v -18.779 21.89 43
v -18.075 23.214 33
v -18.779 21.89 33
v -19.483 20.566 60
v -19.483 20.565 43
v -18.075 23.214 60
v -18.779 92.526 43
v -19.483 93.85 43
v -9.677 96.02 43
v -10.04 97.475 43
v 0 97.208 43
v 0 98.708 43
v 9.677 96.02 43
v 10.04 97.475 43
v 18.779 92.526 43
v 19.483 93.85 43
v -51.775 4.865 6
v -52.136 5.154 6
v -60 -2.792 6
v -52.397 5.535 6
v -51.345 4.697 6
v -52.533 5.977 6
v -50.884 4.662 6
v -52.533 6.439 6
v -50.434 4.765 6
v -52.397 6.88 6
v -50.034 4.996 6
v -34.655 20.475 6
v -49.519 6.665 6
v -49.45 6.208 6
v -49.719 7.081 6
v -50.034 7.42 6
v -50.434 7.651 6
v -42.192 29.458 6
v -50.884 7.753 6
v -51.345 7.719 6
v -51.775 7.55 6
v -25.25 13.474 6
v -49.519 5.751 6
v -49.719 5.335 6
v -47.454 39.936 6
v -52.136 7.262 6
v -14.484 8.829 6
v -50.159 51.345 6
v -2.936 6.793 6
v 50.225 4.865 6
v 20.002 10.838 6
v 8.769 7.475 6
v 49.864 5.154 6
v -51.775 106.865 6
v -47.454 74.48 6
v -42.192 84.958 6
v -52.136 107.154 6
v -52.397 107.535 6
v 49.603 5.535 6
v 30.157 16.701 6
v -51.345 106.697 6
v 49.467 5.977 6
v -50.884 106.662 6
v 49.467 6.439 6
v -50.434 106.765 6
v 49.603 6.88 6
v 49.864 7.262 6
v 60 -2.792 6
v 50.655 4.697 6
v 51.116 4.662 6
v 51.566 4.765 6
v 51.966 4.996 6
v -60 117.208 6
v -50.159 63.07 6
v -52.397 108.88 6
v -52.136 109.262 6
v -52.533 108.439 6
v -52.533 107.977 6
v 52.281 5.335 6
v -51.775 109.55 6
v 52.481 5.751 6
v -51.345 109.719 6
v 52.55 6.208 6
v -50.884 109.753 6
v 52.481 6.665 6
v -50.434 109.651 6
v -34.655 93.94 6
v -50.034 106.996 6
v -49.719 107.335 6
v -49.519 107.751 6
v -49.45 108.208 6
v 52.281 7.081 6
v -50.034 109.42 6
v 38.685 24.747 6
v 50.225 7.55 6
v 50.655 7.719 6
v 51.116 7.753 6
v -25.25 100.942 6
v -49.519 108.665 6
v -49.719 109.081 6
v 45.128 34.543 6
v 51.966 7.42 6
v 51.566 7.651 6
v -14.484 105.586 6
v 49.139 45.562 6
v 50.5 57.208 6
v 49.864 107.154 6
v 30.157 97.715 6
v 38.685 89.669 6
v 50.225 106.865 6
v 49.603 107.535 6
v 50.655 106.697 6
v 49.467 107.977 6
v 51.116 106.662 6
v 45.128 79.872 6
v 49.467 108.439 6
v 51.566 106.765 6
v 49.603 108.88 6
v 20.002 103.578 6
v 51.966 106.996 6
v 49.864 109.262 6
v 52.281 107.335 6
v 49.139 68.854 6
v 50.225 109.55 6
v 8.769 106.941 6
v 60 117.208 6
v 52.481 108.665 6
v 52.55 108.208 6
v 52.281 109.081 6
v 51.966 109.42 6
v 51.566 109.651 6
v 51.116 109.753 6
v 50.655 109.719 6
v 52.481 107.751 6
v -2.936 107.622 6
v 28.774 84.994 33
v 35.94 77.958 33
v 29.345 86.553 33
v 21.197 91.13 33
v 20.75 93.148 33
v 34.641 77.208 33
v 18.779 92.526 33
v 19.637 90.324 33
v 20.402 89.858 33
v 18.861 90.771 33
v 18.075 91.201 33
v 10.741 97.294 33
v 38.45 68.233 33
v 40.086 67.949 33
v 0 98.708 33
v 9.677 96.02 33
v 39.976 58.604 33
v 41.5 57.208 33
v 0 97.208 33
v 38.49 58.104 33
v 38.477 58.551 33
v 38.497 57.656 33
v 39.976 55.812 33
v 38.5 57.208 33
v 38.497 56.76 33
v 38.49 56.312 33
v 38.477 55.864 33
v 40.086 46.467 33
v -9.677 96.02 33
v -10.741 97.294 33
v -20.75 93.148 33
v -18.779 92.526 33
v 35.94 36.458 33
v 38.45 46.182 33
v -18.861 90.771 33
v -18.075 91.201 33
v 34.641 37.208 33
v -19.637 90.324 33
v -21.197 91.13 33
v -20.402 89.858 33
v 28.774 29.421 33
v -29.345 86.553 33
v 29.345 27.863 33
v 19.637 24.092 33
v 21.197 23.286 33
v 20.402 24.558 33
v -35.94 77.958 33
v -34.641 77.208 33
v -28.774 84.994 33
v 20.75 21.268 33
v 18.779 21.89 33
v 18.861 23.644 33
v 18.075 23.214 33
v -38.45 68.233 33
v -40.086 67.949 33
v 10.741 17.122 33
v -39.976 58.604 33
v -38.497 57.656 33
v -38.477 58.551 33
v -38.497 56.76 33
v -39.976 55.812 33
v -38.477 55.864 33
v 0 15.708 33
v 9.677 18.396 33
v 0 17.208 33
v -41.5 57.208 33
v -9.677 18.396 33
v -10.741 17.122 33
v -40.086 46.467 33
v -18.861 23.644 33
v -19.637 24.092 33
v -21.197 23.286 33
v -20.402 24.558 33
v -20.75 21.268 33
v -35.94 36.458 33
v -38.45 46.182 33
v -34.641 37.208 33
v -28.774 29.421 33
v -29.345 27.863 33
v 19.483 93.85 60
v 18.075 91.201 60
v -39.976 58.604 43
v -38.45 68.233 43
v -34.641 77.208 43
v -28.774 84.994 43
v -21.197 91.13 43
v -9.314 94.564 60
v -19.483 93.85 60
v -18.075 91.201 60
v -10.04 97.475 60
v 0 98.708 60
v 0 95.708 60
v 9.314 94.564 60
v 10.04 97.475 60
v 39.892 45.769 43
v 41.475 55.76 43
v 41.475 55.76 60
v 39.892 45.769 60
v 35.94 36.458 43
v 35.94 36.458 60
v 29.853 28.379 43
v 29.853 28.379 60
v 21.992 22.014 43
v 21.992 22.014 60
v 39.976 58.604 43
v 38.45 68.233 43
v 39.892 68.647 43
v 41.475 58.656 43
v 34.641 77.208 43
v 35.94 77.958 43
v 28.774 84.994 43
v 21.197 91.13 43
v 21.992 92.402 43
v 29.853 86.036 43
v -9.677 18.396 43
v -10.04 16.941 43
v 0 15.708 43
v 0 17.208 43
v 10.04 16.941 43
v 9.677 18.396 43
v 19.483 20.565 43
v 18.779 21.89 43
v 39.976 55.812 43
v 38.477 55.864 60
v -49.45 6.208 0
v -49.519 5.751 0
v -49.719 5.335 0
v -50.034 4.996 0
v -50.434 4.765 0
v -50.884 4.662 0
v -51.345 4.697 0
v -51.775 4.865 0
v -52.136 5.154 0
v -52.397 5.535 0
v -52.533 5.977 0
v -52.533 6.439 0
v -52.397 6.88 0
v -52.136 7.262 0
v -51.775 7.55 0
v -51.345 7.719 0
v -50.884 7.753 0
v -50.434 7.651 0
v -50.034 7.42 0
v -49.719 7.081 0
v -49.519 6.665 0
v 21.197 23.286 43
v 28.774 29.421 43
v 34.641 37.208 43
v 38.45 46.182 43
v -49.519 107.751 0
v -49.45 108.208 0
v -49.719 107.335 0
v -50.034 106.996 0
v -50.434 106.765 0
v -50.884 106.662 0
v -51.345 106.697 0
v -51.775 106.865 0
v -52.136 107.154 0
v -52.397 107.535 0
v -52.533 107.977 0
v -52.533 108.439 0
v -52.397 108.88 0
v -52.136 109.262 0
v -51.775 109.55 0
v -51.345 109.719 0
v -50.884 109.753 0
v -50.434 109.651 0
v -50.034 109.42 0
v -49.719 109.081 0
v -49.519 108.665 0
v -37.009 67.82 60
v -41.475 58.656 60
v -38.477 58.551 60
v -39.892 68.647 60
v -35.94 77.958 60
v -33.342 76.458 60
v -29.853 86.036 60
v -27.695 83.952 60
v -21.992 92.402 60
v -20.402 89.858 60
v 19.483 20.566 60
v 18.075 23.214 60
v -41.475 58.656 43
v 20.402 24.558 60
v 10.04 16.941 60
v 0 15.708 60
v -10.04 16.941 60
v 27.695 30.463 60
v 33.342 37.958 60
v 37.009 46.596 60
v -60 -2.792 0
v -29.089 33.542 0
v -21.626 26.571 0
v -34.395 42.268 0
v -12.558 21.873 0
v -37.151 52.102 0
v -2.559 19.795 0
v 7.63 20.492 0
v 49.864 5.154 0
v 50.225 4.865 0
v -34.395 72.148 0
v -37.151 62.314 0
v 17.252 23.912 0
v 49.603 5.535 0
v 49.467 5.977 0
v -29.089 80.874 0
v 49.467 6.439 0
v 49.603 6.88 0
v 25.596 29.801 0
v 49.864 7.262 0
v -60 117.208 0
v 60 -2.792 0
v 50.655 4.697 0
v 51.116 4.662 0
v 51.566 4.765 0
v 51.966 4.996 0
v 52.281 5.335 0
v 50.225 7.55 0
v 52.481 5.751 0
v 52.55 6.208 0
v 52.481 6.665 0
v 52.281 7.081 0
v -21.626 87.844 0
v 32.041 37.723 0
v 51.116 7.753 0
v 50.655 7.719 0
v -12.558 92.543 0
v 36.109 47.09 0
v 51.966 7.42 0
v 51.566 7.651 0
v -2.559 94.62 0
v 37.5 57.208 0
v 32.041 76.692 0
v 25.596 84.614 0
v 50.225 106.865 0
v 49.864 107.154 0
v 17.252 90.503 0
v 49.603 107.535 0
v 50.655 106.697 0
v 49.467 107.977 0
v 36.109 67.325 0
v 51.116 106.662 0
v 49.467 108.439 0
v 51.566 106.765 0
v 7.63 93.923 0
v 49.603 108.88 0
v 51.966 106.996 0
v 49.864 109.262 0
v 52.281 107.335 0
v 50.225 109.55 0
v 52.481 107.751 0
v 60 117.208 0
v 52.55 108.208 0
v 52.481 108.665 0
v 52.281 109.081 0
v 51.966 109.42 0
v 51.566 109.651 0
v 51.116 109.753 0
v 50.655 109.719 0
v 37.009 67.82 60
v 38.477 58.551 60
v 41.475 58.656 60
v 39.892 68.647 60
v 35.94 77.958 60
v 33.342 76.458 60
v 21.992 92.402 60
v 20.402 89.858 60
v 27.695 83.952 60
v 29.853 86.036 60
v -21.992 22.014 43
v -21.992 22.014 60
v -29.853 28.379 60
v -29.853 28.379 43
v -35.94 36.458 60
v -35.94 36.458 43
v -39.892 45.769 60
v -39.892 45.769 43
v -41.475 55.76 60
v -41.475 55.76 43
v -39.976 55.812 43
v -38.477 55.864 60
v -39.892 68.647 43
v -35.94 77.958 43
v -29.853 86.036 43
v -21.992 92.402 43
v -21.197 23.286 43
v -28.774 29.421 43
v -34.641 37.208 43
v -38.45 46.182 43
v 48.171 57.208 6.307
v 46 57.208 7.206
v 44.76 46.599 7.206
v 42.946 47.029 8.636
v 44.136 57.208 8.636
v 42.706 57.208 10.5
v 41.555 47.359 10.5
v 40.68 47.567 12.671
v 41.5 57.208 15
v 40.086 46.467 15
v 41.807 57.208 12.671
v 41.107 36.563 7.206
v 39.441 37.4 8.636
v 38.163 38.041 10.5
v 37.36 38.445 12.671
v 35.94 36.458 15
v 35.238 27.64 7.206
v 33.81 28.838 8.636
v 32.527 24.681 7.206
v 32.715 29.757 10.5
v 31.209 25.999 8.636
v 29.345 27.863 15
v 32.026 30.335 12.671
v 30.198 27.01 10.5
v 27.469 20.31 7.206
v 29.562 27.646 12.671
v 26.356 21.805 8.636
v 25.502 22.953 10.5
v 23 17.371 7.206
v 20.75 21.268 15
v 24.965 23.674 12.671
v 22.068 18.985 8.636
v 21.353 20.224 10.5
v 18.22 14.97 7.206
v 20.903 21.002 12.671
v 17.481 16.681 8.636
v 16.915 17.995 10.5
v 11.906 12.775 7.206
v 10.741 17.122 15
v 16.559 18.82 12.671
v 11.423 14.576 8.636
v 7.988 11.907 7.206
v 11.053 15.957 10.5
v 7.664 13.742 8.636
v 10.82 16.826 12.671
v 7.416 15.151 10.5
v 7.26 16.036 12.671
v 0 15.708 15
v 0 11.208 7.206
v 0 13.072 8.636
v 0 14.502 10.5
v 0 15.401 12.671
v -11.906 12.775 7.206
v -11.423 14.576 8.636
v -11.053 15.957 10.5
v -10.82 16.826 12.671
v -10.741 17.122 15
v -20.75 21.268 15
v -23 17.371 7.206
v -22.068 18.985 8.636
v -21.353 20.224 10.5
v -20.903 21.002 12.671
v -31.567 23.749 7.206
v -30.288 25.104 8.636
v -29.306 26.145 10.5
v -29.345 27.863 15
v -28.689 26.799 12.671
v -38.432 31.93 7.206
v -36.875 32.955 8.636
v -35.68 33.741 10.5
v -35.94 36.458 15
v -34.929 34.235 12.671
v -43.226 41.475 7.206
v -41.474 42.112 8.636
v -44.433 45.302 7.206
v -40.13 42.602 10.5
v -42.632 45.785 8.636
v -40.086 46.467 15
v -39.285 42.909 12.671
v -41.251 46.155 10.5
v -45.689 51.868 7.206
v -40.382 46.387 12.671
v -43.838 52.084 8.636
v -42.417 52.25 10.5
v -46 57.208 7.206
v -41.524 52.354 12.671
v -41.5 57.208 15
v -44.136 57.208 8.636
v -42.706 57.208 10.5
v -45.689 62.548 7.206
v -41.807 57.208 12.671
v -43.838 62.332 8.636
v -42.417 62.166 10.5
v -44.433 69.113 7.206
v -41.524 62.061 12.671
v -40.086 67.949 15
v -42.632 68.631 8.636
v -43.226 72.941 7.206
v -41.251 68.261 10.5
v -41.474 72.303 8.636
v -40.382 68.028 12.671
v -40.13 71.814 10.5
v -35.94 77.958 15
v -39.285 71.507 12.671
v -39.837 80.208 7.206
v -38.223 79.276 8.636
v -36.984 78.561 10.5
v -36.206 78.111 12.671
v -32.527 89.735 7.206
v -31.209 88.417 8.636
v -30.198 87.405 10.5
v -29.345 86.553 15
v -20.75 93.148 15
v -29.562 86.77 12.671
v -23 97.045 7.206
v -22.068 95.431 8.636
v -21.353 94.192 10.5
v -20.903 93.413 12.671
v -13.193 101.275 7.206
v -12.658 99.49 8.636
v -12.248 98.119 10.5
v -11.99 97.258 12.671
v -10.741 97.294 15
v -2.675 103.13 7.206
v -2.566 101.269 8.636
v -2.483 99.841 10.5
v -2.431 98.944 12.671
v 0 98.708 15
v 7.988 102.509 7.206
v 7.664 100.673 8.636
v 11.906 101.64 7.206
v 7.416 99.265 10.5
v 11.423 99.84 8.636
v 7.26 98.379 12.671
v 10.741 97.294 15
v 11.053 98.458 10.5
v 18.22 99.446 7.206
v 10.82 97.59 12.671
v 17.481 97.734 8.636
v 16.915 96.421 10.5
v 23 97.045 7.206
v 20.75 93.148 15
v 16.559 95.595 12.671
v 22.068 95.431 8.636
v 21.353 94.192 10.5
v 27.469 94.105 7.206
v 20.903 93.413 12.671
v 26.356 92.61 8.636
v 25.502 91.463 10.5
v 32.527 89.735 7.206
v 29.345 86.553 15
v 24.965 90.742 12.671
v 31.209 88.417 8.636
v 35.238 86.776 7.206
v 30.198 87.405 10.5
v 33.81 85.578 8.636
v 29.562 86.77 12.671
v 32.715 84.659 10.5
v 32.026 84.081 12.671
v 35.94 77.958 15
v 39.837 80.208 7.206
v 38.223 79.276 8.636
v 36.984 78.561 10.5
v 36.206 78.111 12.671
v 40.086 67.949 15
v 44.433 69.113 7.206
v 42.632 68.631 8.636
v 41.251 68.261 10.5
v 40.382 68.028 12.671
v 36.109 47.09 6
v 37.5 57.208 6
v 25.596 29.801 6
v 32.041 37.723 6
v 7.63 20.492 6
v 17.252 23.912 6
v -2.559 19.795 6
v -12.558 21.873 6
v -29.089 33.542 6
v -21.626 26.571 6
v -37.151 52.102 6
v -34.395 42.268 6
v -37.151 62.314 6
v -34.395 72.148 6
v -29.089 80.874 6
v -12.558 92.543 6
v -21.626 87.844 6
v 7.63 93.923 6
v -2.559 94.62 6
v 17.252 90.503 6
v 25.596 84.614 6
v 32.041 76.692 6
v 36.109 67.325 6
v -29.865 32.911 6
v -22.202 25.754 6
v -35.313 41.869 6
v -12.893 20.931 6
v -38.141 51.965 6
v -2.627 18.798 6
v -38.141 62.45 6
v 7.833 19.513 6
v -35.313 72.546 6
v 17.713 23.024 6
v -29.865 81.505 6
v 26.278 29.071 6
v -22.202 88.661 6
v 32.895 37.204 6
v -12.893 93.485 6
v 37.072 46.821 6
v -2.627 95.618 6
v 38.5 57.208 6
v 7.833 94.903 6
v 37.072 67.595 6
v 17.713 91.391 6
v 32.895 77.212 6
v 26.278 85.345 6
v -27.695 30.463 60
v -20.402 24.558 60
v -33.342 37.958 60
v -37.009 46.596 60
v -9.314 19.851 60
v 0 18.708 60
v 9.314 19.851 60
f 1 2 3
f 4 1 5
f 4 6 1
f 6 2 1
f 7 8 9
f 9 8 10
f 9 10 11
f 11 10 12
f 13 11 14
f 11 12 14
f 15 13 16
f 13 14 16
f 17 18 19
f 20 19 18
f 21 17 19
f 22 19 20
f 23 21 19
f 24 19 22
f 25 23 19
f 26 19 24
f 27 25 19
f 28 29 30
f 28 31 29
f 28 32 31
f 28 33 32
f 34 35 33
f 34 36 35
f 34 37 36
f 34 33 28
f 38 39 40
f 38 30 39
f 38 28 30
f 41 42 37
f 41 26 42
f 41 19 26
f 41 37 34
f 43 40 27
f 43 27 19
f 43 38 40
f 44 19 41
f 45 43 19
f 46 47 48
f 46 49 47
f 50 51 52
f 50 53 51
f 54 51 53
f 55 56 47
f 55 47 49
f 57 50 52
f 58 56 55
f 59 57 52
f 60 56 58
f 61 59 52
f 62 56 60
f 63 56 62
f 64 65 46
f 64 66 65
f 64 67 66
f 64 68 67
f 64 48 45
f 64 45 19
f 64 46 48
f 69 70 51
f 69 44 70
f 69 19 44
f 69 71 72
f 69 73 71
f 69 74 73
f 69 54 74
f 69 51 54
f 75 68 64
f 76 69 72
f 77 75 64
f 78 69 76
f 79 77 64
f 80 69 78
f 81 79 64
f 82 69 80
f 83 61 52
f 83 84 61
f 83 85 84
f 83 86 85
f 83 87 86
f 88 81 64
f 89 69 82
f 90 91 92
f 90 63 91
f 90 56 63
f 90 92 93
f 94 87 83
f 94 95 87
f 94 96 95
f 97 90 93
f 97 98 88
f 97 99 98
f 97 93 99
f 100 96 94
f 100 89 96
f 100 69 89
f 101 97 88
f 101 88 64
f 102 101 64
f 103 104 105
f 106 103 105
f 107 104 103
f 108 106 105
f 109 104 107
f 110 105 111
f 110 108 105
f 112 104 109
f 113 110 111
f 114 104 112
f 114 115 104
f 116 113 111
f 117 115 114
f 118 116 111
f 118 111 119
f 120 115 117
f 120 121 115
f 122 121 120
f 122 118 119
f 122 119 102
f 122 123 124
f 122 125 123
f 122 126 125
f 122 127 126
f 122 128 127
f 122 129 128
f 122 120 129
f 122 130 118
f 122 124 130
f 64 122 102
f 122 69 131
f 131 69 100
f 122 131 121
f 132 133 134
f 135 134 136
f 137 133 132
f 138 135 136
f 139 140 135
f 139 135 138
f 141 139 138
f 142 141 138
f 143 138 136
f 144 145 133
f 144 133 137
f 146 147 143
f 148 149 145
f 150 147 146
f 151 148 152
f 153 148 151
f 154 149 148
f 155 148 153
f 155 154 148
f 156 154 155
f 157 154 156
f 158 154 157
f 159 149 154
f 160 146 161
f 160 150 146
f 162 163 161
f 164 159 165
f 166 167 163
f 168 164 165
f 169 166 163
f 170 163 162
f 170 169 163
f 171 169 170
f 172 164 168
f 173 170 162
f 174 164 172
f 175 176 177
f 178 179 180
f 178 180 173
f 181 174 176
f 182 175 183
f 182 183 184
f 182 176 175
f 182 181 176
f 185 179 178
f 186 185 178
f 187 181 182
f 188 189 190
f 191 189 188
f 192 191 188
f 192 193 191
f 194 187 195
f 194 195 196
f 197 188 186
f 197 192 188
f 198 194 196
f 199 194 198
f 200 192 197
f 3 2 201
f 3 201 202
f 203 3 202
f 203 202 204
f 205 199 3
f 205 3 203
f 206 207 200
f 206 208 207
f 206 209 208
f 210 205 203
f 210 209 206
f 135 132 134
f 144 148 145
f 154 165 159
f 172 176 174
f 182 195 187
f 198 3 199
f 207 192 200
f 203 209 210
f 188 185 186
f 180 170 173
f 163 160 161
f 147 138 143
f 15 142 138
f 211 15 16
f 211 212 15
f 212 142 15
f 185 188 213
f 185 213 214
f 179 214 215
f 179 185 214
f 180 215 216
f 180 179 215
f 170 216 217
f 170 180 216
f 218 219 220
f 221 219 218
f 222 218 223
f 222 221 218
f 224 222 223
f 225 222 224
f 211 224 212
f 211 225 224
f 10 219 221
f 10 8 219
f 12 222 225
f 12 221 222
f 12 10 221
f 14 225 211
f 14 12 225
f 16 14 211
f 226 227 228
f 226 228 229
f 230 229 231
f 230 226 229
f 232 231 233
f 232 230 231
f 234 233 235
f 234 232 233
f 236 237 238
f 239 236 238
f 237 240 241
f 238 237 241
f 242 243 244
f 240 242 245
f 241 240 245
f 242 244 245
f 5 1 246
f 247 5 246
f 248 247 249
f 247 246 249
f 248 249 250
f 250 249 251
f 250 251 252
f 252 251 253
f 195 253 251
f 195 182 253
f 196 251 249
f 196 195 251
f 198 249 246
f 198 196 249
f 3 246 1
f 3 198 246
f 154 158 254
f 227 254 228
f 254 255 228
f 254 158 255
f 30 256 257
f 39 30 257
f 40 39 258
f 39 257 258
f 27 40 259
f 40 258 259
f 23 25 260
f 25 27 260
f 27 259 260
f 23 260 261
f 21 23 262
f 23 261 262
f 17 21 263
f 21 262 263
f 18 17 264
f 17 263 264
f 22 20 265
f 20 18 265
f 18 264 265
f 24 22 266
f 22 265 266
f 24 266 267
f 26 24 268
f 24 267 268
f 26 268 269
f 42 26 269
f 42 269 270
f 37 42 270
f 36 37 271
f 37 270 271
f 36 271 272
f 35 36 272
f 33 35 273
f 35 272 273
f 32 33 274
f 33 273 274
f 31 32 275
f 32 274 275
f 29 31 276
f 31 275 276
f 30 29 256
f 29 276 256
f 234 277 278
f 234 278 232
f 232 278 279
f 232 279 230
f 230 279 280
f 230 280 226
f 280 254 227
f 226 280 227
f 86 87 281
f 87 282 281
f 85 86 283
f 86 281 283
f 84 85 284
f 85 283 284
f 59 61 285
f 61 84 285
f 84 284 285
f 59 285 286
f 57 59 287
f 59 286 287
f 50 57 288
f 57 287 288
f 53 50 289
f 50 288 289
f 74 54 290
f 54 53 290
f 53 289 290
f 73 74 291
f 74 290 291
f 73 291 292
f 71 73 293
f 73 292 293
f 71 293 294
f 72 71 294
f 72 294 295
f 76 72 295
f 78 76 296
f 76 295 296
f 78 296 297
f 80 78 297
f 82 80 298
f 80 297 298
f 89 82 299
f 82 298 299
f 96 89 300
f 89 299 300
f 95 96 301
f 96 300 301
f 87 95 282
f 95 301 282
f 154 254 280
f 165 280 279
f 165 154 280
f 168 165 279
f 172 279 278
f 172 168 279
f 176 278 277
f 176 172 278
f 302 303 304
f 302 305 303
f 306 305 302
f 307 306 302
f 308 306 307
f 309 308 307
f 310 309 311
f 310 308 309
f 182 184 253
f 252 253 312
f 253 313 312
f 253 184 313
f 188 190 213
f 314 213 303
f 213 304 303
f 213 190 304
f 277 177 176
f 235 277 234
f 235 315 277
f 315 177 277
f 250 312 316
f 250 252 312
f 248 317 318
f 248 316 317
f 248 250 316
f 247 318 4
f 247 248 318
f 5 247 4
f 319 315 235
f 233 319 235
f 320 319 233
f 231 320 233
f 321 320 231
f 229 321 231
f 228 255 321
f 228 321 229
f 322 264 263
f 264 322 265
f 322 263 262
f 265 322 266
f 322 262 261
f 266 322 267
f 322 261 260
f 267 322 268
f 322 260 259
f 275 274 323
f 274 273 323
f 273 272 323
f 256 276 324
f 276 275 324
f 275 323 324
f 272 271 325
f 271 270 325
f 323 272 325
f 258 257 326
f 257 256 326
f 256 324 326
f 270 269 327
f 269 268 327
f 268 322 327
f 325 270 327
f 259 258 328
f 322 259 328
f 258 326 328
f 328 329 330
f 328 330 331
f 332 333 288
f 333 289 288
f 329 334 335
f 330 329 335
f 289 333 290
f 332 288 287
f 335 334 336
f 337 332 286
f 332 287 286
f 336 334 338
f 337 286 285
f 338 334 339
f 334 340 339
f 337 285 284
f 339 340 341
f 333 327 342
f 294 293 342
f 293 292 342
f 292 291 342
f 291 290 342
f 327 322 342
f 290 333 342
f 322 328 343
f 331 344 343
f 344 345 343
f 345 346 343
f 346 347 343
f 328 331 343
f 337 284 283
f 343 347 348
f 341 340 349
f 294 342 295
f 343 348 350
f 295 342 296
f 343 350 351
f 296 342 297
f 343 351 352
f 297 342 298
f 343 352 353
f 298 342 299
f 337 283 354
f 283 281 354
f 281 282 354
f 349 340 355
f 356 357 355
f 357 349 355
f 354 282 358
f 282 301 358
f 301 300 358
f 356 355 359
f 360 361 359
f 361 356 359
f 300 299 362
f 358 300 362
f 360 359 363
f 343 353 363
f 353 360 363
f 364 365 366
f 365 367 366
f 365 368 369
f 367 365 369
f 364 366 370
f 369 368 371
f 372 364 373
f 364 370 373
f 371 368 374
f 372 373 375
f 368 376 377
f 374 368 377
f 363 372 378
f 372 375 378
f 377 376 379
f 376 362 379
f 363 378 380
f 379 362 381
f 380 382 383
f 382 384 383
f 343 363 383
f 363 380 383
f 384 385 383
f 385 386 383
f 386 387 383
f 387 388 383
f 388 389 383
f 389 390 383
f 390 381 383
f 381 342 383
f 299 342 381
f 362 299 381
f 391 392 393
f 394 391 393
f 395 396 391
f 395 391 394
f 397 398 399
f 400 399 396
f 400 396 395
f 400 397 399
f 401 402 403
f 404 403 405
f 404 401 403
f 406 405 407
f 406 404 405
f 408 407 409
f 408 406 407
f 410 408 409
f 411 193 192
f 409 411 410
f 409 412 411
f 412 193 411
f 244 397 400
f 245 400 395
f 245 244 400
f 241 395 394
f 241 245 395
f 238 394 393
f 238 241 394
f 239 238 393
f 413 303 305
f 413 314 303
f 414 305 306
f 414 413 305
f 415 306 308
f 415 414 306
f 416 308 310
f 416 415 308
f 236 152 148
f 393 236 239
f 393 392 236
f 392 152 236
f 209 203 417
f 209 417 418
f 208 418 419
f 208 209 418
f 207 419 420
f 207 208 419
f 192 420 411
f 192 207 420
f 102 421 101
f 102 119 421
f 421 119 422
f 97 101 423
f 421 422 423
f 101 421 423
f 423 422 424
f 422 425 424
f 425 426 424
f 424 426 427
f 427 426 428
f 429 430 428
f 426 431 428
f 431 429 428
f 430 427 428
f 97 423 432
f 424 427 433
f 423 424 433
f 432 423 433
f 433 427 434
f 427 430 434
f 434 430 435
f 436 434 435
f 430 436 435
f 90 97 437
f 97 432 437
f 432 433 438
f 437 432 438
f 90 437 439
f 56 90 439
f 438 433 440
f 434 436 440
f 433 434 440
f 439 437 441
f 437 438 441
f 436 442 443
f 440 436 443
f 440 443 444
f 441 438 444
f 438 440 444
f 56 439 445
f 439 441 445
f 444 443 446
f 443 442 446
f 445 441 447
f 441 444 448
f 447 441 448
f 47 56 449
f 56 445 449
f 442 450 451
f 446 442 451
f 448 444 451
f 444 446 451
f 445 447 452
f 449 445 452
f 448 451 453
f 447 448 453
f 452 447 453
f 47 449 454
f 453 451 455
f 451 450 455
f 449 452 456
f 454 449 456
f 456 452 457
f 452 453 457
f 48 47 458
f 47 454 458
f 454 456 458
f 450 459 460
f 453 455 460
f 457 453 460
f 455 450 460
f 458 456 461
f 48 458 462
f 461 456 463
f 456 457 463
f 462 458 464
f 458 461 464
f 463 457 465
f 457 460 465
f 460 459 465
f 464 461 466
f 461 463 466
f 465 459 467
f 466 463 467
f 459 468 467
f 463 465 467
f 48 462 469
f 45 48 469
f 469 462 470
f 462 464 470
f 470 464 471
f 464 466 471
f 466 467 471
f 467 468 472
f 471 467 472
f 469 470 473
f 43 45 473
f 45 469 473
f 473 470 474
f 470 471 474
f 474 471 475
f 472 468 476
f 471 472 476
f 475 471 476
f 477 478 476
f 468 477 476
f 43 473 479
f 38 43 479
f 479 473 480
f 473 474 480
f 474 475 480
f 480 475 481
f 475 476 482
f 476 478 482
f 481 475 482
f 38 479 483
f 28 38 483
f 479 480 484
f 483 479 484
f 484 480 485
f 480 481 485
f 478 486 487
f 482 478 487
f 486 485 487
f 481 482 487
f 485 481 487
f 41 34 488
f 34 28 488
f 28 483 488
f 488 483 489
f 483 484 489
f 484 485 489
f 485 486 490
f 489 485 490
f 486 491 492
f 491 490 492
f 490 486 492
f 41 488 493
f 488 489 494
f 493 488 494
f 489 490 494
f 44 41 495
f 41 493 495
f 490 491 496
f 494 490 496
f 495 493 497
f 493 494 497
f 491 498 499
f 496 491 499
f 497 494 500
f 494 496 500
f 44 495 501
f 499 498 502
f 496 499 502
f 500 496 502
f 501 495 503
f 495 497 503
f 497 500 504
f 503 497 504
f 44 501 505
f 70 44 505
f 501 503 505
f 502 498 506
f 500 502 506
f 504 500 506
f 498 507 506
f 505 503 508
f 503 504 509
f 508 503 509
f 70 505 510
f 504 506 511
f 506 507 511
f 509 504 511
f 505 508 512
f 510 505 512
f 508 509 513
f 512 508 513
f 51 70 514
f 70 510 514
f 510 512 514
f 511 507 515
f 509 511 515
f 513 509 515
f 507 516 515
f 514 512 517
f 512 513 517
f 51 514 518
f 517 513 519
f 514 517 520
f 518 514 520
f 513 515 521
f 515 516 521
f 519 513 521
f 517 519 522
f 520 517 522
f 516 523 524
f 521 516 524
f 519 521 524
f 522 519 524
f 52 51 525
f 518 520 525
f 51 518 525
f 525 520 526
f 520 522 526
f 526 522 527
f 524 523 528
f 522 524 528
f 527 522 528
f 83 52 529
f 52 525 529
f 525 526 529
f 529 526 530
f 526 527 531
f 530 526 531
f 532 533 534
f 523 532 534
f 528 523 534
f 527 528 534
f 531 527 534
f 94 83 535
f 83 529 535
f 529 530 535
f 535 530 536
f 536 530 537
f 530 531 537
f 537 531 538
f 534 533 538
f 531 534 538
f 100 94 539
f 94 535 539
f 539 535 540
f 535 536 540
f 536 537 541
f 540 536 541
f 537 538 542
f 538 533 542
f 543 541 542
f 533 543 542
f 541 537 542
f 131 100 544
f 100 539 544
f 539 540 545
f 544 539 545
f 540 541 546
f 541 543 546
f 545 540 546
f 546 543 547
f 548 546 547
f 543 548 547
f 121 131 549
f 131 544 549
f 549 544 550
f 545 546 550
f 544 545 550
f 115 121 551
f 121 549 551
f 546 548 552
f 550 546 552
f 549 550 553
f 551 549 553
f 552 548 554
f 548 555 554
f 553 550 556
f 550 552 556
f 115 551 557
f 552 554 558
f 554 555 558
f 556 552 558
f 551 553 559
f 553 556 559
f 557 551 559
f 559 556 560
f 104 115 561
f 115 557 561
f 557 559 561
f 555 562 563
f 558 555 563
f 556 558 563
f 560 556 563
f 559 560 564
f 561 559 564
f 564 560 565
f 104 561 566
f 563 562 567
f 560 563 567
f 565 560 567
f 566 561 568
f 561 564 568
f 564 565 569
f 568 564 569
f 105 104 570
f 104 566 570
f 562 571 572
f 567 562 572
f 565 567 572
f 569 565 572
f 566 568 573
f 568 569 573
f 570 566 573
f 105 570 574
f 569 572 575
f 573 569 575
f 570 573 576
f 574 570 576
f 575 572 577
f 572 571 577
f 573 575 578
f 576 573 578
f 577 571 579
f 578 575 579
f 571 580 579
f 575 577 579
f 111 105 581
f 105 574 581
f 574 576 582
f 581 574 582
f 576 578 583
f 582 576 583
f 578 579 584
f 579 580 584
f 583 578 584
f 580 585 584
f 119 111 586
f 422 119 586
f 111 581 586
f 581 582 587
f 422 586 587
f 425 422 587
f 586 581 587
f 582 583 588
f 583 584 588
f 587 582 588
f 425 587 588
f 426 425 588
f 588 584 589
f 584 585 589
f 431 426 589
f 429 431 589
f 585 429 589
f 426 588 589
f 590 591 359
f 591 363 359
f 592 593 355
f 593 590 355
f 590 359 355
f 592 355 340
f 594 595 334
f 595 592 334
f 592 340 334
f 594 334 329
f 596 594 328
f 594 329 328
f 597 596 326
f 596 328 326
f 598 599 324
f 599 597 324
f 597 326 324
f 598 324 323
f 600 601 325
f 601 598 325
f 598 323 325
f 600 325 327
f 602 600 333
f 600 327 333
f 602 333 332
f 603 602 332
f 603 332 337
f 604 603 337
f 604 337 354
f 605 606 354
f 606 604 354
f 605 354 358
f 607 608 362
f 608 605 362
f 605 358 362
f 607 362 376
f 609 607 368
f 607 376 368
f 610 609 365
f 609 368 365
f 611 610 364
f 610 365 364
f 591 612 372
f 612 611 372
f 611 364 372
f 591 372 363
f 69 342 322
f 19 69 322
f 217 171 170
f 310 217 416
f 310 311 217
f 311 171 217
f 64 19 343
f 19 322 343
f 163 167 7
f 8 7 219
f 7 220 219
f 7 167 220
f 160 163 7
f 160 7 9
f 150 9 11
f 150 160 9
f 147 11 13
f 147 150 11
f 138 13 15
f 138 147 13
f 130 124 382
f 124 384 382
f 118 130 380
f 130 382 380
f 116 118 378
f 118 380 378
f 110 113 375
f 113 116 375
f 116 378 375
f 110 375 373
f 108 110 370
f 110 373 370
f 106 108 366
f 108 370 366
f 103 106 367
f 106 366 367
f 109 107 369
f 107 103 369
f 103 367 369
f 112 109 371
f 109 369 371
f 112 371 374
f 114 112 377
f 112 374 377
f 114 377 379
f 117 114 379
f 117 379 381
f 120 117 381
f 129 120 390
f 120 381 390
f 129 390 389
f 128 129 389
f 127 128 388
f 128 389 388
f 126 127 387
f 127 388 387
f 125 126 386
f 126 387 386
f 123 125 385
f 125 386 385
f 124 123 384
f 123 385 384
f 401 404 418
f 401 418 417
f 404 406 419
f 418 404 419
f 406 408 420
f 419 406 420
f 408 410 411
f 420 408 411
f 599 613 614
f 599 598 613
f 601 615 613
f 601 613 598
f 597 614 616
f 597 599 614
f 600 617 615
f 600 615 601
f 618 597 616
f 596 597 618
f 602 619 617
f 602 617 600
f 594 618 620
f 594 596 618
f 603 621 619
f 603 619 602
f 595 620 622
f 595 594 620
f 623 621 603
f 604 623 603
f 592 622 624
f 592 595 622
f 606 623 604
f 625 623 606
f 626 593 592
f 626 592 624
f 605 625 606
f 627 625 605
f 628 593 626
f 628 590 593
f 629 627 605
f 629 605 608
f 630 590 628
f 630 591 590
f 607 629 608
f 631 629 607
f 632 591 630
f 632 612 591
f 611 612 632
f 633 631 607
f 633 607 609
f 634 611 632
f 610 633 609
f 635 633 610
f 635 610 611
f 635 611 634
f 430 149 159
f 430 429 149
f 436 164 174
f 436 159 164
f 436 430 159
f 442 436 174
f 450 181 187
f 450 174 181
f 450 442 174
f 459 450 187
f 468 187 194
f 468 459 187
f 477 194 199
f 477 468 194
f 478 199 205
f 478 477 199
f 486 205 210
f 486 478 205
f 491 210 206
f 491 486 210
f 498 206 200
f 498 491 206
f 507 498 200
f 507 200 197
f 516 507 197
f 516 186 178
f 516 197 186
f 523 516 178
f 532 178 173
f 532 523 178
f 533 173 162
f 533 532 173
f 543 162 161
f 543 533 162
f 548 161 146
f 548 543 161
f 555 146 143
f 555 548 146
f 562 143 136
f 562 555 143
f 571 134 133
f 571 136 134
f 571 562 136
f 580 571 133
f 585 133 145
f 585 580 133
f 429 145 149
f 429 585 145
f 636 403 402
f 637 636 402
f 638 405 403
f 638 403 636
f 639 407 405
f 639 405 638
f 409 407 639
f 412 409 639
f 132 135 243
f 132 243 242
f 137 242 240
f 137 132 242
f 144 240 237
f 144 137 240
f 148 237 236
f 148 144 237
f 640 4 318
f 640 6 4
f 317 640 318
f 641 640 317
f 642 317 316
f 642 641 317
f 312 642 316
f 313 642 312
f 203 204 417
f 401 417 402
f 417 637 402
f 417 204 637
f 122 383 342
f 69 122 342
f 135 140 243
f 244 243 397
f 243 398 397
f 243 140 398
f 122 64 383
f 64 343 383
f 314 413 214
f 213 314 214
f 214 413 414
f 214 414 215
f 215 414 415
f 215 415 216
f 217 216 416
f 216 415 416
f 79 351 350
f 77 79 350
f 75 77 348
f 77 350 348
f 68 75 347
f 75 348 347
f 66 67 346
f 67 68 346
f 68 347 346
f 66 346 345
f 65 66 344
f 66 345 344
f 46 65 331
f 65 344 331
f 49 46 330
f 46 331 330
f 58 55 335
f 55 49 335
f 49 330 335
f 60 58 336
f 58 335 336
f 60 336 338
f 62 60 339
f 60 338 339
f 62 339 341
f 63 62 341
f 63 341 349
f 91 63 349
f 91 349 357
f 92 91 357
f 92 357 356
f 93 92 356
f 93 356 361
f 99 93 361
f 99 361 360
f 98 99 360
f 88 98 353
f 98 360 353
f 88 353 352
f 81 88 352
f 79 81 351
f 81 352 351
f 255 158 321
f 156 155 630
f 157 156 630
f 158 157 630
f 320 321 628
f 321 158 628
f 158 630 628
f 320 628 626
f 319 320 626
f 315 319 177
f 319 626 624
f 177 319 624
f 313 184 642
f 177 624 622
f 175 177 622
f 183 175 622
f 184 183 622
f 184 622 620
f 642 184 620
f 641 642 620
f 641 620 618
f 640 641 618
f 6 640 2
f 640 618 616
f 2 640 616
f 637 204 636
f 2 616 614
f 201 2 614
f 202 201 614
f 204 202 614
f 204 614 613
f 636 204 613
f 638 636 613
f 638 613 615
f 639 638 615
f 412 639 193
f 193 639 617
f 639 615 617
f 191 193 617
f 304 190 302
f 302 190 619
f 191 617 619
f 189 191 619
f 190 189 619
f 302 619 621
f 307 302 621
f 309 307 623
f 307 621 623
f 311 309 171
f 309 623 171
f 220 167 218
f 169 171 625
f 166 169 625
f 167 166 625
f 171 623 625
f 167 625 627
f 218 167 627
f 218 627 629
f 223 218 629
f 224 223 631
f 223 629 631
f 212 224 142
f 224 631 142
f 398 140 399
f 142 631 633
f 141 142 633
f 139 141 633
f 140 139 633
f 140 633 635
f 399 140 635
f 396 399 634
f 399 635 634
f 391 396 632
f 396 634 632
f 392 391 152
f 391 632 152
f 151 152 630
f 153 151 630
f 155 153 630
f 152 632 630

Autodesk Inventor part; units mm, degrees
ref_plane "YZ Plane" through (0, 0, 0) normal (1, 0, 0) x (0, 1, 0)
ref_plane "XZ Plane" through (0, 0, 0) normal (0, 1, 0) x (-1, 0, 0)
sketch "Sketch1" plane through (0, 0, 0) normal (0, 0, 1) x (1, 0, 0)
  circle A0 centre (-51, -113.7922) radius 1.55 projected
  circle A1 centre (51, -113.7922) radius 1.55 projected
  circle A2 centre (-51, 108.2078) radius 1.55 projected
  circle A3 centre (51, 6.2078) radius 1.55 projected
  circle A4 centre (51, 108.2078) radius 1.55 projected
  circle A5 centre (-51, 6.2078) radius 1.55 projected
  circle A6 centre (51, -11.7922) radius 1.55 projected
  circle A7 centre (-51, -11.7922) radius 1.55 projected
  circle A8 centre (0, -62.7922) radius 54 projected
  circle A9 centre (0, 57.2078) radius 54 projected
  line L0 (-60, 117.2078) -> (-60, -112.7922) projected
  arc A10 (-60, -112.7922) -> (-50, -122.7922) centre (-50, -112.7922) ccw projected
  line L1 (-50, -122.7922) -> (50, -122.7922) projected
  arc A11 (50, -122.7922) -> (60, -112.7922) centre (50, -112.7922) ccw projected
  line L2 (60, -112.7922) -> (60, 117.2078) projected
  line L3 (60, 117.2078) -> (-60, 117.2078) projected
  line L4 (-60, -2.7922) -> (60, -2.7922)
  line L5 (60, -2.7922) -> (60, 117.2078)
  line L6 (60, 117.2078) -> (-60, 117.2078)
  line L7 (-60, 117.2078) -> (-60, -2.7922)
  line L8 (-60, -2.7922) -> (60, 117.2078) construction
  line L9 (60, -2.7922) -> (-60, 117.2078) construction
  circle A12 centre (0, 57.2078) radius 37.5
  point P0 (0, 0)
  dimension "d3" = 75
extrude "Extrusion1" add sketch "Sketch1" along normal blind 6 contours A9 | L3 L2 L4 L0
sketch "Sketch3" plane through (0, 0, 6) normal (0, 0, 1) x (1, 0, 0)
  circle A0 centre (0, 57.2078) radius 37.5 construction
  circle A1 centre (0, 57.2078) radius 38.5
  circle A2 centre (0, 57.2078) radius 41.5
  point P0 (0, 0)
  dimension "d4" = 77
  dimension "d5" = 3
extrude "Extrusion2" add sketch "Sketch3" along normal blind 54
ref_plane "Work Plane1" through (0, 57.2078, 33) normal (0, 0, 1) x (1, 0, 0)
sketch "Sketch4" plane through (0, 57.2078, 33) normal (0, 0, 1) x (1, 0, 0)
  circle A0 centre (0, 0) radius 38.5 construction
  circle A1 centre (0, 0) radius 41.5 projected
  circle A2 centre (0, 0) radius 40
  point P0 (0, -57.2078)
  dimension "d9" = 1.5
extrude "Extrusion3" cut sketch "Sketch4" along normal blind 10
sketch "Sketch5" plane through (0, 57.2078, 60) normal (0, 0, 1) x (1, 0, 0)
  circle A0 centre (0, 0) radius 38.5 projected
  circle A1 centre (0, 0) radius 41.5 projected
  line L0 (0, 0) -> (-53, 0) construction
  line L1 (0, 0) -> (-41.4747, -1.4483)
  circle A2 centre (0, 0) radius 41.5 projected
  line L2 (0, 0) -> (-41.4747, 1.4483)
  point P0 (0, -57.2078)
  dimension "d12" = 4
extrude "Extrusion4" cut sketch "Sketch5" against normal up to surface (27 mm away) contours L2 L1 A0 | A0 L1 A1 L2 picked at (-25.658, -0.5972) picked at (-40.4973, 0.1493)
pattern_circular "Circular Pattern1" count 6 over 360 about axis through (0, 57.2078, 6) along (0, 0, 1) of "Extrusion4"
fillet "Fillet1" radius 9 1 edges at (-41.5, 57.2078, 6)
equation "\"d0\" = 2 * thickness"
equation "\"d5\" = thickness"
equation "\"d6\" = fixture_height"
equation "\"d9\" = 0.5 * thickness"
equation "\"d18\" = 3 * thickness"
equation "\"thickness\" = 3"
equation "\"fixture_height\" = 18 * thickness"
equation "\"d8\" = -0.5 * fixture_height"
properties part number "Cup_Dispenser_Fixture"
